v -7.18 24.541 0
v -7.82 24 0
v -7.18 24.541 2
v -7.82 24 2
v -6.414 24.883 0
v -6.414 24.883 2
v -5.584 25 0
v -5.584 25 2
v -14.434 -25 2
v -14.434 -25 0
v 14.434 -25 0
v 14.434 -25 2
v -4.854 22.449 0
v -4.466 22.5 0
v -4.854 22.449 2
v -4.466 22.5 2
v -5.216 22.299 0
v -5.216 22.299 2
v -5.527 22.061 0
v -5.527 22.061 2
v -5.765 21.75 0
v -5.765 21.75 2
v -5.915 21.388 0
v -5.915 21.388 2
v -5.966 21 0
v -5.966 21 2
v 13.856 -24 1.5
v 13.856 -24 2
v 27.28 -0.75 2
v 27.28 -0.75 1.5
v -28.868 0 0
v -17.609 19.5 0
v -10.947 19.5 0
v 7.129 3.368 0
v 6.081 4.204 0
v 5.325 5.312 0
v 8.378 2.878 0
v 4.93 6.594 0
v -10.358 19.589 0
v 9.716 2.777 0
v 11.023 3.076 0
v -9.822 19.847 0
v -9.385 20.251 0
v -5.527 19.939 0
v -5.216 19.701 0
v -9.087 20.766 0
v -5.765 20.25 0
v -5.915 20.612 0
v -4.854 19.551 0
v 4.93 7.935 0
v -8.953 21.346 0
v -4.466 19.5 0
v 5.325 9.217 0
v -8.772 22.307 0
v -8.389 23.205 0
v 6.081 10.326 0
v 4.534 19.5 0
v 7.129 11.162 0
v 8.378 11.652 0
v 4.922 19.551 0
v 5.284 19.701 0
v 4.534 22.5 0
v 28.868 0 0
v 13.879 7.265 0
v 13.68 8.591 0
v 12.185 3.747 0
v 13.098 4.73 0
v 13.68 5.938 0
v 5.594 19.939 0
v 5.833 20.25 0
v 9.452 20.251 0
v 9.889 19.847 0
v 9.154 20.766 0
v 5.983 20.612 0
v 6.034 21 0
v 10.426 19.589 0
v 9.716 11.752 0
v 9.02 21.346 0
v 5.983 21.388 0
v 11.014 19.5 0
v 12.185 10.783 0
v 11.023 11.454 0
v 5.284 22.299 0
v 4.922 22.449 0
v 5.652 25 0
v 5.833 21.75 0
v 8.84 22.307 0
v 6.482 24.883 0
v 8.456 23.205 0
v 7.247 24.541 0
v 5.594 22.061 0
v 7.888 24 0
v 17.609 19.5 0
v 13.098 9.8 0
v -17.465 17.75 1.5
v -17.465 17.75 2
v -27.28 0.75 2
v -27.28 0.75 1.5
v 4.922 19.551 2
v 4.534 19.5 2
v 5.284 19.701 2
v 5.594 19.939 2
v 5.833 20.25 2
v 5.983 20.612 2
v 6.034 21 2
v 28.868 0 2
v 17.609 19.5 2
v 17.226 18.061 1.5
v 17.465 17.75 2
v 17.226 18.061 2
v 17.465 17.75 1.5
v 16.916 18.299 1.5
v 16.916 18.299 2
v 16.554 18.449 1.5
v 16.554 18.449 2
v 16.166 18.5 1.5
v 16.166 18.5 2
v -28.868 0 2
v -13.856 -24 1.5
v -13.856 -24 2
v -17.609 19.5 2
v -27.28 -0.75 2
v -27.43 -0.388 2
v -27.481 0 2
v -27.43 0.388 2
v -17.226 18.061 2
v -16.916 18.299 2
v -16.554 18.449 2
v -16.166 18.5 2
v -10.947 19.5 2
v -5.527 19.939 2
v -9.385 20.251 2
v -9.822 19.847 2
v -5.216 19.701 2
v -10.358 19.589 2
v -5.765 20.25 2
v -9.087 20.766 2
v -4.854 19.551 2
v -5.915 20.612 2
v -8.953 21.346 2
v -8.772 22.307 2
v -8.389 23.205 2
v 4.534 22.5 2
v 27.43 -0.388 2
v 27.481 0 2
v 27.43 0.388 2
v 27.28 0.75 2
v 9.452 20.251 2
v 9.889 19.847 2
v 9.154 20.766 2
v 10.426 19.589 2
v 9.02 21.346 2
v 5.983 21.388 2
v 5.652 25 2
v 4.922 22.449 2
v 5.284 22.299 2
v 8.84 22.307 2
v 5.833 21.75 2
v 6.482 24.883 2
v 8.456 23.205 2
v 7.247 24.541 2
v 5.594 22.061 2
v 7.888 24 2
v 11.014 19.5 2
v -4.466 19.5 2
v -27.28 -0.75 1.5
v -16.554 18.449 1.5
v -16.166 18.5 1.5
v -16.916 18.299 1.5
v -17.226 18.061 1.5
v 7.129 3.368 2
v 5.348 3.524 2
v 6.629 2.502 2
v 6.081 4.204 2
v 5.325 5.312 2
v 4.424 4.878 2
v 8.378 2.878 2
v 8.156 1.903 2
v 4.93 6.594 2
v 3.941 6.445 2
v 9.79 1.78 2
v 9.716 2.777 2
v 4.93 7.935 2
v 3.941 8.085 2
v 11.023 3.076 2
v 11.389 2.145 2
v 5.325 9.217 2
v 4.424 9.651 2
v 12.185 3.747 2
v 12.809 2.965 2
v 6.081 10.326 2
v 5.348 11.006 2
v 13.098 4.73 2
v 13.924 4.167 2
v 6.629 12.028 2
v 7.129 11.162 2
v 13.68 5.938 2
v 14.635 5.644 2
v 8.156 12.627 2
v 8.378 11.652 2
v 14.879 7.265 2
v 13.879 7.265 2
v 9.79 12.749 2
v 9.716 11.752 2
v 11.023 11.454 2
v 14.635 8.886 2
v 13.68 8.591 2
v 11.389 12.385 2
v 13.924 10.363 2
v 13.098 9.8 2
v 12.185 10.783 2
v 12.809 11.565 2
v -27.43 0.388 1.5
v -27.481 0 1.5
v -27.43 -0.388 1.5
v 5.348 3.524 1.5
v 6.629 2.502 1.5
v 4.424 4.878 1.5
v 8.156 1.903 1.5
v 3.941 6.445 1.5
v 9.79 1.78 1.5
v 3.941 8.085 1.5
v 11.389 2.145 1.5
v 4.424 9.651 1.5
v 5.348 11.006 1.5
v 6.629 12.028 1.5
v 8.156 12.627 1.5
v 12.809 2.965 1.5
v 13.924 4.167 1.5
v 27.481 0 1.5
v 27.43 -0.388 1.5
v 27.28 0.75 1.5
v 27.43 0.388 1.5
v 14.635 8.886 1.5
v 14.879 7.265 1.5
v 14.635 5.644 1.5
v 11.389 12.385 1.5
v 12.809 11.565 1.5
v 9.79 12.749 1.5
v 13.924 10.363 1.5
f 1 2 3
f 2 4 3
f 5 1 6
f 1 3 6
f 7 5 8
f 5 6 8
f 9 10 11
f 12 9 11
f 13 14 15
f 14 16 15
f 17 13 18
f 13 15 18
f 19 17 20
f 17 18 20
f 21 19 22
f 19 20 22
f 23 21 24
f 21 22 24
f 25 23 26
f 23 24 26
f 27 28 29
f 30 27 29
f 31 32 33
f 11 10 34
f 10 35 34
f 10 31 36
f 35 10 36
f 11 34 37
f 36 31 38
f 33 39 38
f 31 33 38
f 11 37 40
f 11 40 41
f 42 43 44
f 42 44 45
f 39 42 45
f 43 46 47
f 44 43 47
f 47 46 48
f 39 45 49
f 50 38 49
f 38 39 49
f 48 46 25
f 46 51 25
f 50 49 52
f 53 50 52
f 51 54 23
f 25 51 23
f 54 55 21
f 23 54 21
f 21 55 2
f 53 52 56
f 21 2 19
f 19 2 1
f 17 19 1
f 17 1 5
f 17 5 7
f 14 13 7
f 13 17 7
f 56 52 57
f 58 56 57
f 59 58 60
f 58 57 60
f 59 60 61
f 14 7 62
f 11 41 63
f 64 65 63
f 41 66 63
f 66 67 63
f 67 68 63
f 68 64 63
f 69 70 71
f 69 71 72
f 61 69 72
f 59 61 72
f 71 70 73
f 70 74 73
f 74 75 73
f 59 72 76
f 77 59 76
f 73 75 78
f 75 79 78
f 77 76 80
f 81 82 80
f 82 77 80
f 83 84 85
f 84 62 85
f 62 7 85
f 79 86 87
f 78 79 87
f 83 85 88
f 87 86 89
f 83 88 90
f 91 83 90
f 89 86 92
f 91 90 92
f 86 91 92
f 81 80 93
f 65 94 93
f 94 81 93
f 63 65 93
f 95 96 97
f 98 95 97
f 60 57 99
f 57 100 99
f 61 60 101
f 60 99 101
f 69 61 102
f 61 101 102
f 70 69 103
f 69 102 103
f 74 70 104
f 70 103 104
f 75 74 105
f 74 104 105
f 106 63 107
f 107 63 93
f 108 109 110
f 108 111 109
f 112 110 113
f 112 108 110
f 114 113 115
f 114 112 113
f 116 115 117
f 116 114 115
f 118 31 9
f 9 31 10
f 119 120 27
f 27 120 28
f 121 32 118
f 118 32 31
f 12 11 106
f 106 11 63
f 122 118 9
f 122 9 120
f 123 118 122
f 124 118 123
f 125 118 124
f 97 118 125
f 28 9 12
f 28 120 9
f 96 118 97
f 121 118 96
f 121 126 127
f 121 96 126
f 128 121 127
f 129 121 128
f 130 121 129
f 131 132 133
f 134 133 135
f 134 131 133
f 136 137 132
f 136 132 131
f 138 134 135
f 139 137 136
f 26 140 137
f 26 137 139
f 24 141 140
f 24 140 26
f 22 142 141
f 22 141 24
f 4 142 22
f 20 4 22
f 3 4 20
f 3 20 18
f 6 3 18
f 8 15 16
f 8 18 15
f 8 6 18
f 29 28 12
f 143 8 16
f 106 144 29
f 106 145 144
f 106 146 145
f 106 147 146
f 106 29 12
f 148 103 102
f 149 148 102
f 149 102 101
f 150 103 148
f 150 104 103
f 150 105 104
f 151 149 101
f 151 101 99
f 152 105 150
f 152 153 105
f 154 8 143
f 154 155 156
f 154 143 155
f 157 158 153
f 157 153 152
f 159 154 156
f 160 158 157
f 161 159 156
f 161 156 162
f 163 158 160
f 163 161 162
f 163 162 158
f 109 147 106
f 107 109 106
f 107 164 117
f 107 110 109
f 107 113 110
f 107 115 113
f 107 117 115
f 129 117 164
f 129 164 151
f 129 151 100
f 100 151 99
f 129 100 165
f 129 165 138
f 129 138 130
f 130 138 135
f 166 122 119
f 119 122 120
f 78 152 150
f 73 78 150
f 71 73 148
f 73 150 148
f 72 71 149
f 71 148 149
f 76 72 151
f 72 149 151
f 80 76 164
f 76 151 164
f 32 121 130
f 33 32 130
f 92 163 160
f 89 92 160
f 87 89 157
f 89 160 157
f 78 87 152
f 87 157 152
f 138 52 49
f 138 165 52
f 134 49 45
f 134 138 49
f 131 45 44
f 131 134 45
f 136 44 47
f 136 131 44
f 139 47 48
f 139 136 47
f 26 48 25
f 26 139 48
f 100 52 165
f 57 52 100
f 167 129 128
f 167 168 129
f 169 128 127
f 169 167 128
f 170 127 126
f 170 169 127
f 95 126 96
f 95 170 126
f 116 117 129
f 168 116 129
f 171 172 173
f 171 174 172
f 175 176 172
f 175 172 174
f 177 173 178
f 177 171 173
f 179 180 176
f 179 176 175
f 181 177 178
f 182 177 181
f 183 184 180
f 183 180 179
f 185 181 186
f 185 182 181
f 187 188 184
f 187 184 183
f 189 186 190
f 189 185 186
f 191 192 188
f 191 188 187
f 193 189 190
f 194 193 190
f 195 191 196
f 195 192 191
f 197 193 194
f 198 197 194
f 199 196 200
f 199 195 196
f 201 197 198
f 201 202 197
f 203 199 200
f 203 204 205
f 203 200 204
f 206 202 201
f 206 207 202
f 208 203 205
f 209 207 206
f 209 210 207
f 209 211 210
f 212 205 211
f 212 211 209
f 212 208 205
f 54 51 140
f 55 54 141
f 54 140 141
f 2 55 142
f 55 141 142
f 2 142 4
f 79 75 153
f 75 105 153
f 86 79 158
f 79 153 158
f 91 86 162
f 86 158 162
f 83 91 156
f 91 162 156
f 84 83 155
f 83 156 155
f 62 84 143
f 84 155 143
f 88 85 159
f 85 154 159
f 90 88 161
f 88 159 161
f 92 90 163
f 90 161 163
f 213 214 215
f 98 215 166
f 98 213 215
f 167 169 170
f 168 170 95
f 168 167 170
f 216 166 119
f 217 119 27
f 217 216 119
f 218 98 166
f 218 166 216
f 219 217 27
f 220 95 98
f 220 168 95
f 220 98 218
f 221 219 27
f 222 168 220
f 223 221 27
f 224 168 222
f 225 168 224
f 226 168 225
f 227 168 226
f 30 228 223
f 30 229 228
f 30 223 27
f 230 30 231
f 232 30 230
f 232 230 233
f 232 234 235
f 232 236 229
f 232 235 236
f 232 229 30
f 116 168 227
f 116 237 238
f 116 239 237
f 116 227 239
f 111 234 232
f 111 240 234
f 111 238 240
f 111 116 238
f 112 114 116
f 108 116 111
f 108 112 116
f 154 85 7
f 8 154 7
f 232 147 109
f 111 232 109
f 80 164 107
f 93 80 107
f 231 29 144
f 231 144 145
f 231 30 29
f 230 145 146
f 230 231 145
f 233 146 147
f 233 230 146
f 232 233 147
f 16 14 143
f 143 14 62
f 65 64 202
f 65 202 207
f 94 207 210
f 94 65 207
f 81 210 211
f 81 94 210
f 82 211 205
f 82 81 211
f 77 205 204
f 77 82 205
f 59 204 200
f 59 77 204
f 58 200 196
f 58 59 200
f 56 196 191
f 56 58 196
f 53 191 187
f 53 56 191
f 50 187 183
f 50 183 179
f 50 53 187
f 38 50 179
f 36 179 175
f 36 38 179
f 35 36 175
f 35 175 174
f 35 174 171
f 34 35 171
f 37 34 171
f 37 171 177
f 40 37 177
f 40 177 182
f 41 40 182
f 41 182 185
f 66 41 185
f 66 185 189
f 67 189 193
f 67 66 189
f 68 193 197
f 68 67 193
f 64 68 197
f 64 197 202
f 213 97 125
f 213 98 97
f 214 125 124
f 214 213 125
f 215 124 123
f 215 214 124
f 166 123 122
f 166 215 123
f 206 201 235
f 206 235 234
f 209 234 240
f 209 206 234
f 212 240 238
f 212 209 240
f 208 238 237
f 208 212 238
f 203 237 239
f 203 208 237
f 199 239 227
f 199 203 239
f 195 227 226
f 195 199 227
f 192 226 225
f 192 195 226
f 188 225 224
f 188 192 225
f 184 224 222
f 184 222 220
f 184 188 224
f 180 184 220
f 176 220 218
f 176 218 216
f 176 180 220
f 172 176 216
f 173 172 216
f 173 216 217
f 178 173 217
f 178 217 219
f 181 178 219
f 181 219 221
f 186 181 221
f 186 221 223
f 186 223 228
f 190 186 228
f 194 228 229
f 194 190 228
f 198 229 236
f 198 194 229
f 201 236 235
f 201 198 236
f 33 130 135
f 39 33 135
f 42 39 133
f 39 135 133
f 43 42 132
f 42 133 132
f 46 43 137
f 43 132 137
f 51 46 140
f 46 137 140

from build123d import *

# Parameters (mm, degrees)
F0_R     = 4.5
F0_W     = 12
F0_H     = 3
F1_DEPTH = 2
F2_R     = 5.5
F3_DEPTH = 0.5
F5_R     = 1.49999
F7_DEPTH = 25
F8_R     = 3


# Not quite as in the source:
# - a fillet or chamfer is up to 0.001 mm smaller than in the source, because OpenCascade refuses the exact size


with BuildPart() as f1:
    # F0 (on Top) → F1 (new body)
    with BuildSketch(Plane.XY):
        Polygon((14.4337567297, -25), (28.8675134595, 0), (14.4337567297, 25), (-14.4337567297, 25), (-28.8675134595, 0), (-14.4337567297, -25), align=None)
        with Locations((9.37942788, 7.2647714987)):
            Circle(F0_R, mode=Mode.SUBTRACT)
        with Locations((0.0337567297, 21)):
            Rectangle(F0_W, F0_H, mode=Mode.SUBTRACT)
    extrude(amount=F1_DEPTH)

    # F2 (on face) → F3 (cut)
    with BuildSketch(Plane.XY.offset(2)):
        Polygon((-13.8564064606, -24), (13.8564064606, -24), (27.7128129211, 0), (17.0318329411, 18.5), (-17.0318329411, 18.5), (-27.7128129211, 0), align=None)
        with Locations((9.37942788, 7.2647714987)):
            Circle(F2_R, mode=Mode.SUBTRACT)
    extrude(amount=-F3_DEPTH, mode=Mode.SUBTRACT)

    # F5 (radius 1.5 in the source; OpenCascade refuses exactly that, so slightly less here)
    f5_edges = [f1.edges().sort_by_distance(p)[0] for p in [
        (-5.966243, 19.5, 1),
        (6.033757, 19.5, 1),
        (6.033757, 22.5, 1),
        (-5.966243, 22.5, 1),
        (-17.031833, 18.5, 1.75),
        (-27.712813, 0, 1.75),
        (17.031833, 18.5, 1.75),
        (27.712813, 0, 1.75),
    ]]
    fillet(f5_edges, radius=F5_R)

    # F6 (on face) → F7 (cut)
    with BuildSketch(Plane.XY.offset(2)):
        with BuildLine():
            Line((-4.4662432703, 25.5), (4.5337567297, 25.5))
            ThreePointArc((4.5337567297, 25.5), (7.5909047219, 24.3020972357), (9.0204233671, 21.3461538462))
            ThreePointArc((9.0204233671, 21.3461538462), (9.6557649872, 20.0324012286), (11.0144974281, 19.5))
            Line((11.0144974281, 19.5), (21.36195996, 19.5))
            Line((21.36195996, 19.5), (25.703800239, 29.2692627907))
            Line((25.703800239, 29.2692627907), (-20.3538952839, 30.2788760662))
            Line((-20.3538952839, 30.2788760662), (-17.6091832103, 19.5))
            Line((-17.6091832103, 19.5), (-10.9469839687, 19.5))
            ThreePointArc((-10.9469839687, 19.5), (-9.5882515277, 20.0324012286), (-8.9529099076, 21.3461538462))
            ThreePointArc((-8.9529099076, 21.3461538462), (-7.5233912624, 24.3020972357), (-4.4662432703, 25.5))
        make_face()
    extrude(amount=-F7_DEPTH, mode=Mode.SUBTRACT)

    # F8
    f8_edges = [f1.edges().sort_by_distance(p)[0] for p in [
        (-6.527796, 25, 1),
        (6.59531, 25, 1),
    ]]
    fillet(f8_edges, radius=F8_R)


solid = f1.part
